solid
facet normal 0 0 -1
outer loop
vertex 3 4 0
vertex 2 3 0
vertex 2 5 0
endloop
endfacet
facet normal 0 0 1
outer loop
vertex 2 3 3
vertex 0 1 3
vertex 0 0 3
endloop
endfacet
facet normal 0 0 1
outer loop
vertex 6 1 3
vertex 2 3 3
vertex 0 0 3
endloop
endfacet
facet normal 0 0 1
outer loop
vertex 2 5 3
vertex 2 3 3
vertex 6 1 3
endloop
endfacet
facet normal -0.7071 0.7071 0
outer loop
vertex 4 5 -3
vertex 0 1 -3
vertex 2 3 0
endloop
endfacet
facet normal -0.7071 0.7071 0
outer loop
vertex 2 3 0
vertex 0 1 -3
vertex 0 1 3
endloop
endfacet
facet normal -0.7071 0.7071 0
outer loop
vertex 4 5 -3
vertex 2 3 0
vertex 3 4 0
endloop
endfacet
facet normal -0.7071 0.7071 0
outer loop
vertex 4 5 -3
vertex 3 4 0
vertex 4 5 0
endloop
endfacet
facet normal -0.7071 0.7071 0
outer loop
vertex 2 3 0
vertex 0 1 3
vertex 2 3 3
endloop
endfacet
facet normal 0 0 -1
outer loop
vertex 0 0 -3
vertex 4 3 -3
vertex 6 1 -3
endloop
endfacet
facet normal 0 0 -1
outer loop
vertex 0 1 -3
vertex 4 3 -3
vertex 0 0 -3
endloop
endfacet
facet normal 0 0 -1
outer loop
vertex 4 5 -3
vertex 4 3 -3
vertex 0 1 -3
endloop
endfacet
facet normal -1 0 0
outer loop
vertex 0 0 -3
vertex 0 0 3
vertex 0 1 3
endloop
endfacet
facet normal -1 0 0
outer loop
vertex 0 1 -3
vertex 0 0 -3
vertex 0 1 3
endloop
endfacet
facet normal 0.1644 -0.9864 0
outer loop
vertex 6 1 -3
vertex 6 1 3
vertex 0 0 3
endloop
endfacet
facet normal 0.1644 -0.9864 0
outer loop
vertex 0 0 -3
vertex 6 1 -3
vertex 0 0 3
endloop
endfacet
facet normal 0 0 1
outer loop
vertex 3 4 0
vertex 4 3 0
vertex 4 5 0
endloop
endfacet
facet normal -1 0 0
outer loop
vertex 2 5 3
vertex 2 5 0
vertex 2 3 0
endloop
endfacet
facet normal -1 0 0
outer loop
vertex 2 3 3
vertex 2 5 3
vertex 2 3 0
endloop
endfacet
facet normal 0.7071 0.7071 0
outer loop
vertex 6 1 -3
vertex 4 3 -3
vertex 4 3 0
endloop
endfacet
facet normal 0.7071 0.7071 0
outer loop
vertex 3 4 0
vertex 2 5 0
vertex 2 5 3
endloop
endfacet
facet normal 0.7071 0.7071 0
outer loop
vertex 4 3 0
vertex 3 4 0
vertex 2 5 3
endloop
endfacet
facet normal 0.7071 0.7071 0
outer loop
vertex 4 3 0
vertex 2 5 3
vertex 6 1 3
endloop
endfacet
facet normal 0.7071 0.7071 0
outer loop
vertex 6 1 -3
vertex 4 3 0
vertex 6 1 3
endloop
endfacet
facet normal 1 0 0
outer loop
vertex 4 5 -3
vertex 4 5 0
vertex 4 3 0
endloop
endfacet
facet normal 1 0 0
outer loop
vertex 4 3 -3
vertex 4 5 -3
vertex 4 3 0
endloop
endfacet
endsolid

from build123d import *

# Parameters (mm, degrees)
BOSS_EXTRUDE1_DEPTH = 3
BOSS_EXTRUDE2_DEPTH = 3


with BuildPart() as part:
    # Sketch2 → Boss-Extrude1 (new body)
    with BuildSketch(Plane.XY):
        Polygon((0, 0), (6, 1), (2, 5), (2, 3), (0, 1), align=None)
    extrude(amount=BOSS_EXTRUDE1_DEPTH)

    # Sketch3 → Boss-Extrude2 (add)
    with BuildSketch(Plane(origin=(0, 0, 0), x_dir=(-1, 0, 0), z_dir=(0, 0, -1))):
        Polygon((0, 0), (0, 1), (-4, 5), (-4, 3), (-6, 1), align=None)
    extrude(amount=BOSS_EXTRUDE2_DEPTH)


solid = part.part
